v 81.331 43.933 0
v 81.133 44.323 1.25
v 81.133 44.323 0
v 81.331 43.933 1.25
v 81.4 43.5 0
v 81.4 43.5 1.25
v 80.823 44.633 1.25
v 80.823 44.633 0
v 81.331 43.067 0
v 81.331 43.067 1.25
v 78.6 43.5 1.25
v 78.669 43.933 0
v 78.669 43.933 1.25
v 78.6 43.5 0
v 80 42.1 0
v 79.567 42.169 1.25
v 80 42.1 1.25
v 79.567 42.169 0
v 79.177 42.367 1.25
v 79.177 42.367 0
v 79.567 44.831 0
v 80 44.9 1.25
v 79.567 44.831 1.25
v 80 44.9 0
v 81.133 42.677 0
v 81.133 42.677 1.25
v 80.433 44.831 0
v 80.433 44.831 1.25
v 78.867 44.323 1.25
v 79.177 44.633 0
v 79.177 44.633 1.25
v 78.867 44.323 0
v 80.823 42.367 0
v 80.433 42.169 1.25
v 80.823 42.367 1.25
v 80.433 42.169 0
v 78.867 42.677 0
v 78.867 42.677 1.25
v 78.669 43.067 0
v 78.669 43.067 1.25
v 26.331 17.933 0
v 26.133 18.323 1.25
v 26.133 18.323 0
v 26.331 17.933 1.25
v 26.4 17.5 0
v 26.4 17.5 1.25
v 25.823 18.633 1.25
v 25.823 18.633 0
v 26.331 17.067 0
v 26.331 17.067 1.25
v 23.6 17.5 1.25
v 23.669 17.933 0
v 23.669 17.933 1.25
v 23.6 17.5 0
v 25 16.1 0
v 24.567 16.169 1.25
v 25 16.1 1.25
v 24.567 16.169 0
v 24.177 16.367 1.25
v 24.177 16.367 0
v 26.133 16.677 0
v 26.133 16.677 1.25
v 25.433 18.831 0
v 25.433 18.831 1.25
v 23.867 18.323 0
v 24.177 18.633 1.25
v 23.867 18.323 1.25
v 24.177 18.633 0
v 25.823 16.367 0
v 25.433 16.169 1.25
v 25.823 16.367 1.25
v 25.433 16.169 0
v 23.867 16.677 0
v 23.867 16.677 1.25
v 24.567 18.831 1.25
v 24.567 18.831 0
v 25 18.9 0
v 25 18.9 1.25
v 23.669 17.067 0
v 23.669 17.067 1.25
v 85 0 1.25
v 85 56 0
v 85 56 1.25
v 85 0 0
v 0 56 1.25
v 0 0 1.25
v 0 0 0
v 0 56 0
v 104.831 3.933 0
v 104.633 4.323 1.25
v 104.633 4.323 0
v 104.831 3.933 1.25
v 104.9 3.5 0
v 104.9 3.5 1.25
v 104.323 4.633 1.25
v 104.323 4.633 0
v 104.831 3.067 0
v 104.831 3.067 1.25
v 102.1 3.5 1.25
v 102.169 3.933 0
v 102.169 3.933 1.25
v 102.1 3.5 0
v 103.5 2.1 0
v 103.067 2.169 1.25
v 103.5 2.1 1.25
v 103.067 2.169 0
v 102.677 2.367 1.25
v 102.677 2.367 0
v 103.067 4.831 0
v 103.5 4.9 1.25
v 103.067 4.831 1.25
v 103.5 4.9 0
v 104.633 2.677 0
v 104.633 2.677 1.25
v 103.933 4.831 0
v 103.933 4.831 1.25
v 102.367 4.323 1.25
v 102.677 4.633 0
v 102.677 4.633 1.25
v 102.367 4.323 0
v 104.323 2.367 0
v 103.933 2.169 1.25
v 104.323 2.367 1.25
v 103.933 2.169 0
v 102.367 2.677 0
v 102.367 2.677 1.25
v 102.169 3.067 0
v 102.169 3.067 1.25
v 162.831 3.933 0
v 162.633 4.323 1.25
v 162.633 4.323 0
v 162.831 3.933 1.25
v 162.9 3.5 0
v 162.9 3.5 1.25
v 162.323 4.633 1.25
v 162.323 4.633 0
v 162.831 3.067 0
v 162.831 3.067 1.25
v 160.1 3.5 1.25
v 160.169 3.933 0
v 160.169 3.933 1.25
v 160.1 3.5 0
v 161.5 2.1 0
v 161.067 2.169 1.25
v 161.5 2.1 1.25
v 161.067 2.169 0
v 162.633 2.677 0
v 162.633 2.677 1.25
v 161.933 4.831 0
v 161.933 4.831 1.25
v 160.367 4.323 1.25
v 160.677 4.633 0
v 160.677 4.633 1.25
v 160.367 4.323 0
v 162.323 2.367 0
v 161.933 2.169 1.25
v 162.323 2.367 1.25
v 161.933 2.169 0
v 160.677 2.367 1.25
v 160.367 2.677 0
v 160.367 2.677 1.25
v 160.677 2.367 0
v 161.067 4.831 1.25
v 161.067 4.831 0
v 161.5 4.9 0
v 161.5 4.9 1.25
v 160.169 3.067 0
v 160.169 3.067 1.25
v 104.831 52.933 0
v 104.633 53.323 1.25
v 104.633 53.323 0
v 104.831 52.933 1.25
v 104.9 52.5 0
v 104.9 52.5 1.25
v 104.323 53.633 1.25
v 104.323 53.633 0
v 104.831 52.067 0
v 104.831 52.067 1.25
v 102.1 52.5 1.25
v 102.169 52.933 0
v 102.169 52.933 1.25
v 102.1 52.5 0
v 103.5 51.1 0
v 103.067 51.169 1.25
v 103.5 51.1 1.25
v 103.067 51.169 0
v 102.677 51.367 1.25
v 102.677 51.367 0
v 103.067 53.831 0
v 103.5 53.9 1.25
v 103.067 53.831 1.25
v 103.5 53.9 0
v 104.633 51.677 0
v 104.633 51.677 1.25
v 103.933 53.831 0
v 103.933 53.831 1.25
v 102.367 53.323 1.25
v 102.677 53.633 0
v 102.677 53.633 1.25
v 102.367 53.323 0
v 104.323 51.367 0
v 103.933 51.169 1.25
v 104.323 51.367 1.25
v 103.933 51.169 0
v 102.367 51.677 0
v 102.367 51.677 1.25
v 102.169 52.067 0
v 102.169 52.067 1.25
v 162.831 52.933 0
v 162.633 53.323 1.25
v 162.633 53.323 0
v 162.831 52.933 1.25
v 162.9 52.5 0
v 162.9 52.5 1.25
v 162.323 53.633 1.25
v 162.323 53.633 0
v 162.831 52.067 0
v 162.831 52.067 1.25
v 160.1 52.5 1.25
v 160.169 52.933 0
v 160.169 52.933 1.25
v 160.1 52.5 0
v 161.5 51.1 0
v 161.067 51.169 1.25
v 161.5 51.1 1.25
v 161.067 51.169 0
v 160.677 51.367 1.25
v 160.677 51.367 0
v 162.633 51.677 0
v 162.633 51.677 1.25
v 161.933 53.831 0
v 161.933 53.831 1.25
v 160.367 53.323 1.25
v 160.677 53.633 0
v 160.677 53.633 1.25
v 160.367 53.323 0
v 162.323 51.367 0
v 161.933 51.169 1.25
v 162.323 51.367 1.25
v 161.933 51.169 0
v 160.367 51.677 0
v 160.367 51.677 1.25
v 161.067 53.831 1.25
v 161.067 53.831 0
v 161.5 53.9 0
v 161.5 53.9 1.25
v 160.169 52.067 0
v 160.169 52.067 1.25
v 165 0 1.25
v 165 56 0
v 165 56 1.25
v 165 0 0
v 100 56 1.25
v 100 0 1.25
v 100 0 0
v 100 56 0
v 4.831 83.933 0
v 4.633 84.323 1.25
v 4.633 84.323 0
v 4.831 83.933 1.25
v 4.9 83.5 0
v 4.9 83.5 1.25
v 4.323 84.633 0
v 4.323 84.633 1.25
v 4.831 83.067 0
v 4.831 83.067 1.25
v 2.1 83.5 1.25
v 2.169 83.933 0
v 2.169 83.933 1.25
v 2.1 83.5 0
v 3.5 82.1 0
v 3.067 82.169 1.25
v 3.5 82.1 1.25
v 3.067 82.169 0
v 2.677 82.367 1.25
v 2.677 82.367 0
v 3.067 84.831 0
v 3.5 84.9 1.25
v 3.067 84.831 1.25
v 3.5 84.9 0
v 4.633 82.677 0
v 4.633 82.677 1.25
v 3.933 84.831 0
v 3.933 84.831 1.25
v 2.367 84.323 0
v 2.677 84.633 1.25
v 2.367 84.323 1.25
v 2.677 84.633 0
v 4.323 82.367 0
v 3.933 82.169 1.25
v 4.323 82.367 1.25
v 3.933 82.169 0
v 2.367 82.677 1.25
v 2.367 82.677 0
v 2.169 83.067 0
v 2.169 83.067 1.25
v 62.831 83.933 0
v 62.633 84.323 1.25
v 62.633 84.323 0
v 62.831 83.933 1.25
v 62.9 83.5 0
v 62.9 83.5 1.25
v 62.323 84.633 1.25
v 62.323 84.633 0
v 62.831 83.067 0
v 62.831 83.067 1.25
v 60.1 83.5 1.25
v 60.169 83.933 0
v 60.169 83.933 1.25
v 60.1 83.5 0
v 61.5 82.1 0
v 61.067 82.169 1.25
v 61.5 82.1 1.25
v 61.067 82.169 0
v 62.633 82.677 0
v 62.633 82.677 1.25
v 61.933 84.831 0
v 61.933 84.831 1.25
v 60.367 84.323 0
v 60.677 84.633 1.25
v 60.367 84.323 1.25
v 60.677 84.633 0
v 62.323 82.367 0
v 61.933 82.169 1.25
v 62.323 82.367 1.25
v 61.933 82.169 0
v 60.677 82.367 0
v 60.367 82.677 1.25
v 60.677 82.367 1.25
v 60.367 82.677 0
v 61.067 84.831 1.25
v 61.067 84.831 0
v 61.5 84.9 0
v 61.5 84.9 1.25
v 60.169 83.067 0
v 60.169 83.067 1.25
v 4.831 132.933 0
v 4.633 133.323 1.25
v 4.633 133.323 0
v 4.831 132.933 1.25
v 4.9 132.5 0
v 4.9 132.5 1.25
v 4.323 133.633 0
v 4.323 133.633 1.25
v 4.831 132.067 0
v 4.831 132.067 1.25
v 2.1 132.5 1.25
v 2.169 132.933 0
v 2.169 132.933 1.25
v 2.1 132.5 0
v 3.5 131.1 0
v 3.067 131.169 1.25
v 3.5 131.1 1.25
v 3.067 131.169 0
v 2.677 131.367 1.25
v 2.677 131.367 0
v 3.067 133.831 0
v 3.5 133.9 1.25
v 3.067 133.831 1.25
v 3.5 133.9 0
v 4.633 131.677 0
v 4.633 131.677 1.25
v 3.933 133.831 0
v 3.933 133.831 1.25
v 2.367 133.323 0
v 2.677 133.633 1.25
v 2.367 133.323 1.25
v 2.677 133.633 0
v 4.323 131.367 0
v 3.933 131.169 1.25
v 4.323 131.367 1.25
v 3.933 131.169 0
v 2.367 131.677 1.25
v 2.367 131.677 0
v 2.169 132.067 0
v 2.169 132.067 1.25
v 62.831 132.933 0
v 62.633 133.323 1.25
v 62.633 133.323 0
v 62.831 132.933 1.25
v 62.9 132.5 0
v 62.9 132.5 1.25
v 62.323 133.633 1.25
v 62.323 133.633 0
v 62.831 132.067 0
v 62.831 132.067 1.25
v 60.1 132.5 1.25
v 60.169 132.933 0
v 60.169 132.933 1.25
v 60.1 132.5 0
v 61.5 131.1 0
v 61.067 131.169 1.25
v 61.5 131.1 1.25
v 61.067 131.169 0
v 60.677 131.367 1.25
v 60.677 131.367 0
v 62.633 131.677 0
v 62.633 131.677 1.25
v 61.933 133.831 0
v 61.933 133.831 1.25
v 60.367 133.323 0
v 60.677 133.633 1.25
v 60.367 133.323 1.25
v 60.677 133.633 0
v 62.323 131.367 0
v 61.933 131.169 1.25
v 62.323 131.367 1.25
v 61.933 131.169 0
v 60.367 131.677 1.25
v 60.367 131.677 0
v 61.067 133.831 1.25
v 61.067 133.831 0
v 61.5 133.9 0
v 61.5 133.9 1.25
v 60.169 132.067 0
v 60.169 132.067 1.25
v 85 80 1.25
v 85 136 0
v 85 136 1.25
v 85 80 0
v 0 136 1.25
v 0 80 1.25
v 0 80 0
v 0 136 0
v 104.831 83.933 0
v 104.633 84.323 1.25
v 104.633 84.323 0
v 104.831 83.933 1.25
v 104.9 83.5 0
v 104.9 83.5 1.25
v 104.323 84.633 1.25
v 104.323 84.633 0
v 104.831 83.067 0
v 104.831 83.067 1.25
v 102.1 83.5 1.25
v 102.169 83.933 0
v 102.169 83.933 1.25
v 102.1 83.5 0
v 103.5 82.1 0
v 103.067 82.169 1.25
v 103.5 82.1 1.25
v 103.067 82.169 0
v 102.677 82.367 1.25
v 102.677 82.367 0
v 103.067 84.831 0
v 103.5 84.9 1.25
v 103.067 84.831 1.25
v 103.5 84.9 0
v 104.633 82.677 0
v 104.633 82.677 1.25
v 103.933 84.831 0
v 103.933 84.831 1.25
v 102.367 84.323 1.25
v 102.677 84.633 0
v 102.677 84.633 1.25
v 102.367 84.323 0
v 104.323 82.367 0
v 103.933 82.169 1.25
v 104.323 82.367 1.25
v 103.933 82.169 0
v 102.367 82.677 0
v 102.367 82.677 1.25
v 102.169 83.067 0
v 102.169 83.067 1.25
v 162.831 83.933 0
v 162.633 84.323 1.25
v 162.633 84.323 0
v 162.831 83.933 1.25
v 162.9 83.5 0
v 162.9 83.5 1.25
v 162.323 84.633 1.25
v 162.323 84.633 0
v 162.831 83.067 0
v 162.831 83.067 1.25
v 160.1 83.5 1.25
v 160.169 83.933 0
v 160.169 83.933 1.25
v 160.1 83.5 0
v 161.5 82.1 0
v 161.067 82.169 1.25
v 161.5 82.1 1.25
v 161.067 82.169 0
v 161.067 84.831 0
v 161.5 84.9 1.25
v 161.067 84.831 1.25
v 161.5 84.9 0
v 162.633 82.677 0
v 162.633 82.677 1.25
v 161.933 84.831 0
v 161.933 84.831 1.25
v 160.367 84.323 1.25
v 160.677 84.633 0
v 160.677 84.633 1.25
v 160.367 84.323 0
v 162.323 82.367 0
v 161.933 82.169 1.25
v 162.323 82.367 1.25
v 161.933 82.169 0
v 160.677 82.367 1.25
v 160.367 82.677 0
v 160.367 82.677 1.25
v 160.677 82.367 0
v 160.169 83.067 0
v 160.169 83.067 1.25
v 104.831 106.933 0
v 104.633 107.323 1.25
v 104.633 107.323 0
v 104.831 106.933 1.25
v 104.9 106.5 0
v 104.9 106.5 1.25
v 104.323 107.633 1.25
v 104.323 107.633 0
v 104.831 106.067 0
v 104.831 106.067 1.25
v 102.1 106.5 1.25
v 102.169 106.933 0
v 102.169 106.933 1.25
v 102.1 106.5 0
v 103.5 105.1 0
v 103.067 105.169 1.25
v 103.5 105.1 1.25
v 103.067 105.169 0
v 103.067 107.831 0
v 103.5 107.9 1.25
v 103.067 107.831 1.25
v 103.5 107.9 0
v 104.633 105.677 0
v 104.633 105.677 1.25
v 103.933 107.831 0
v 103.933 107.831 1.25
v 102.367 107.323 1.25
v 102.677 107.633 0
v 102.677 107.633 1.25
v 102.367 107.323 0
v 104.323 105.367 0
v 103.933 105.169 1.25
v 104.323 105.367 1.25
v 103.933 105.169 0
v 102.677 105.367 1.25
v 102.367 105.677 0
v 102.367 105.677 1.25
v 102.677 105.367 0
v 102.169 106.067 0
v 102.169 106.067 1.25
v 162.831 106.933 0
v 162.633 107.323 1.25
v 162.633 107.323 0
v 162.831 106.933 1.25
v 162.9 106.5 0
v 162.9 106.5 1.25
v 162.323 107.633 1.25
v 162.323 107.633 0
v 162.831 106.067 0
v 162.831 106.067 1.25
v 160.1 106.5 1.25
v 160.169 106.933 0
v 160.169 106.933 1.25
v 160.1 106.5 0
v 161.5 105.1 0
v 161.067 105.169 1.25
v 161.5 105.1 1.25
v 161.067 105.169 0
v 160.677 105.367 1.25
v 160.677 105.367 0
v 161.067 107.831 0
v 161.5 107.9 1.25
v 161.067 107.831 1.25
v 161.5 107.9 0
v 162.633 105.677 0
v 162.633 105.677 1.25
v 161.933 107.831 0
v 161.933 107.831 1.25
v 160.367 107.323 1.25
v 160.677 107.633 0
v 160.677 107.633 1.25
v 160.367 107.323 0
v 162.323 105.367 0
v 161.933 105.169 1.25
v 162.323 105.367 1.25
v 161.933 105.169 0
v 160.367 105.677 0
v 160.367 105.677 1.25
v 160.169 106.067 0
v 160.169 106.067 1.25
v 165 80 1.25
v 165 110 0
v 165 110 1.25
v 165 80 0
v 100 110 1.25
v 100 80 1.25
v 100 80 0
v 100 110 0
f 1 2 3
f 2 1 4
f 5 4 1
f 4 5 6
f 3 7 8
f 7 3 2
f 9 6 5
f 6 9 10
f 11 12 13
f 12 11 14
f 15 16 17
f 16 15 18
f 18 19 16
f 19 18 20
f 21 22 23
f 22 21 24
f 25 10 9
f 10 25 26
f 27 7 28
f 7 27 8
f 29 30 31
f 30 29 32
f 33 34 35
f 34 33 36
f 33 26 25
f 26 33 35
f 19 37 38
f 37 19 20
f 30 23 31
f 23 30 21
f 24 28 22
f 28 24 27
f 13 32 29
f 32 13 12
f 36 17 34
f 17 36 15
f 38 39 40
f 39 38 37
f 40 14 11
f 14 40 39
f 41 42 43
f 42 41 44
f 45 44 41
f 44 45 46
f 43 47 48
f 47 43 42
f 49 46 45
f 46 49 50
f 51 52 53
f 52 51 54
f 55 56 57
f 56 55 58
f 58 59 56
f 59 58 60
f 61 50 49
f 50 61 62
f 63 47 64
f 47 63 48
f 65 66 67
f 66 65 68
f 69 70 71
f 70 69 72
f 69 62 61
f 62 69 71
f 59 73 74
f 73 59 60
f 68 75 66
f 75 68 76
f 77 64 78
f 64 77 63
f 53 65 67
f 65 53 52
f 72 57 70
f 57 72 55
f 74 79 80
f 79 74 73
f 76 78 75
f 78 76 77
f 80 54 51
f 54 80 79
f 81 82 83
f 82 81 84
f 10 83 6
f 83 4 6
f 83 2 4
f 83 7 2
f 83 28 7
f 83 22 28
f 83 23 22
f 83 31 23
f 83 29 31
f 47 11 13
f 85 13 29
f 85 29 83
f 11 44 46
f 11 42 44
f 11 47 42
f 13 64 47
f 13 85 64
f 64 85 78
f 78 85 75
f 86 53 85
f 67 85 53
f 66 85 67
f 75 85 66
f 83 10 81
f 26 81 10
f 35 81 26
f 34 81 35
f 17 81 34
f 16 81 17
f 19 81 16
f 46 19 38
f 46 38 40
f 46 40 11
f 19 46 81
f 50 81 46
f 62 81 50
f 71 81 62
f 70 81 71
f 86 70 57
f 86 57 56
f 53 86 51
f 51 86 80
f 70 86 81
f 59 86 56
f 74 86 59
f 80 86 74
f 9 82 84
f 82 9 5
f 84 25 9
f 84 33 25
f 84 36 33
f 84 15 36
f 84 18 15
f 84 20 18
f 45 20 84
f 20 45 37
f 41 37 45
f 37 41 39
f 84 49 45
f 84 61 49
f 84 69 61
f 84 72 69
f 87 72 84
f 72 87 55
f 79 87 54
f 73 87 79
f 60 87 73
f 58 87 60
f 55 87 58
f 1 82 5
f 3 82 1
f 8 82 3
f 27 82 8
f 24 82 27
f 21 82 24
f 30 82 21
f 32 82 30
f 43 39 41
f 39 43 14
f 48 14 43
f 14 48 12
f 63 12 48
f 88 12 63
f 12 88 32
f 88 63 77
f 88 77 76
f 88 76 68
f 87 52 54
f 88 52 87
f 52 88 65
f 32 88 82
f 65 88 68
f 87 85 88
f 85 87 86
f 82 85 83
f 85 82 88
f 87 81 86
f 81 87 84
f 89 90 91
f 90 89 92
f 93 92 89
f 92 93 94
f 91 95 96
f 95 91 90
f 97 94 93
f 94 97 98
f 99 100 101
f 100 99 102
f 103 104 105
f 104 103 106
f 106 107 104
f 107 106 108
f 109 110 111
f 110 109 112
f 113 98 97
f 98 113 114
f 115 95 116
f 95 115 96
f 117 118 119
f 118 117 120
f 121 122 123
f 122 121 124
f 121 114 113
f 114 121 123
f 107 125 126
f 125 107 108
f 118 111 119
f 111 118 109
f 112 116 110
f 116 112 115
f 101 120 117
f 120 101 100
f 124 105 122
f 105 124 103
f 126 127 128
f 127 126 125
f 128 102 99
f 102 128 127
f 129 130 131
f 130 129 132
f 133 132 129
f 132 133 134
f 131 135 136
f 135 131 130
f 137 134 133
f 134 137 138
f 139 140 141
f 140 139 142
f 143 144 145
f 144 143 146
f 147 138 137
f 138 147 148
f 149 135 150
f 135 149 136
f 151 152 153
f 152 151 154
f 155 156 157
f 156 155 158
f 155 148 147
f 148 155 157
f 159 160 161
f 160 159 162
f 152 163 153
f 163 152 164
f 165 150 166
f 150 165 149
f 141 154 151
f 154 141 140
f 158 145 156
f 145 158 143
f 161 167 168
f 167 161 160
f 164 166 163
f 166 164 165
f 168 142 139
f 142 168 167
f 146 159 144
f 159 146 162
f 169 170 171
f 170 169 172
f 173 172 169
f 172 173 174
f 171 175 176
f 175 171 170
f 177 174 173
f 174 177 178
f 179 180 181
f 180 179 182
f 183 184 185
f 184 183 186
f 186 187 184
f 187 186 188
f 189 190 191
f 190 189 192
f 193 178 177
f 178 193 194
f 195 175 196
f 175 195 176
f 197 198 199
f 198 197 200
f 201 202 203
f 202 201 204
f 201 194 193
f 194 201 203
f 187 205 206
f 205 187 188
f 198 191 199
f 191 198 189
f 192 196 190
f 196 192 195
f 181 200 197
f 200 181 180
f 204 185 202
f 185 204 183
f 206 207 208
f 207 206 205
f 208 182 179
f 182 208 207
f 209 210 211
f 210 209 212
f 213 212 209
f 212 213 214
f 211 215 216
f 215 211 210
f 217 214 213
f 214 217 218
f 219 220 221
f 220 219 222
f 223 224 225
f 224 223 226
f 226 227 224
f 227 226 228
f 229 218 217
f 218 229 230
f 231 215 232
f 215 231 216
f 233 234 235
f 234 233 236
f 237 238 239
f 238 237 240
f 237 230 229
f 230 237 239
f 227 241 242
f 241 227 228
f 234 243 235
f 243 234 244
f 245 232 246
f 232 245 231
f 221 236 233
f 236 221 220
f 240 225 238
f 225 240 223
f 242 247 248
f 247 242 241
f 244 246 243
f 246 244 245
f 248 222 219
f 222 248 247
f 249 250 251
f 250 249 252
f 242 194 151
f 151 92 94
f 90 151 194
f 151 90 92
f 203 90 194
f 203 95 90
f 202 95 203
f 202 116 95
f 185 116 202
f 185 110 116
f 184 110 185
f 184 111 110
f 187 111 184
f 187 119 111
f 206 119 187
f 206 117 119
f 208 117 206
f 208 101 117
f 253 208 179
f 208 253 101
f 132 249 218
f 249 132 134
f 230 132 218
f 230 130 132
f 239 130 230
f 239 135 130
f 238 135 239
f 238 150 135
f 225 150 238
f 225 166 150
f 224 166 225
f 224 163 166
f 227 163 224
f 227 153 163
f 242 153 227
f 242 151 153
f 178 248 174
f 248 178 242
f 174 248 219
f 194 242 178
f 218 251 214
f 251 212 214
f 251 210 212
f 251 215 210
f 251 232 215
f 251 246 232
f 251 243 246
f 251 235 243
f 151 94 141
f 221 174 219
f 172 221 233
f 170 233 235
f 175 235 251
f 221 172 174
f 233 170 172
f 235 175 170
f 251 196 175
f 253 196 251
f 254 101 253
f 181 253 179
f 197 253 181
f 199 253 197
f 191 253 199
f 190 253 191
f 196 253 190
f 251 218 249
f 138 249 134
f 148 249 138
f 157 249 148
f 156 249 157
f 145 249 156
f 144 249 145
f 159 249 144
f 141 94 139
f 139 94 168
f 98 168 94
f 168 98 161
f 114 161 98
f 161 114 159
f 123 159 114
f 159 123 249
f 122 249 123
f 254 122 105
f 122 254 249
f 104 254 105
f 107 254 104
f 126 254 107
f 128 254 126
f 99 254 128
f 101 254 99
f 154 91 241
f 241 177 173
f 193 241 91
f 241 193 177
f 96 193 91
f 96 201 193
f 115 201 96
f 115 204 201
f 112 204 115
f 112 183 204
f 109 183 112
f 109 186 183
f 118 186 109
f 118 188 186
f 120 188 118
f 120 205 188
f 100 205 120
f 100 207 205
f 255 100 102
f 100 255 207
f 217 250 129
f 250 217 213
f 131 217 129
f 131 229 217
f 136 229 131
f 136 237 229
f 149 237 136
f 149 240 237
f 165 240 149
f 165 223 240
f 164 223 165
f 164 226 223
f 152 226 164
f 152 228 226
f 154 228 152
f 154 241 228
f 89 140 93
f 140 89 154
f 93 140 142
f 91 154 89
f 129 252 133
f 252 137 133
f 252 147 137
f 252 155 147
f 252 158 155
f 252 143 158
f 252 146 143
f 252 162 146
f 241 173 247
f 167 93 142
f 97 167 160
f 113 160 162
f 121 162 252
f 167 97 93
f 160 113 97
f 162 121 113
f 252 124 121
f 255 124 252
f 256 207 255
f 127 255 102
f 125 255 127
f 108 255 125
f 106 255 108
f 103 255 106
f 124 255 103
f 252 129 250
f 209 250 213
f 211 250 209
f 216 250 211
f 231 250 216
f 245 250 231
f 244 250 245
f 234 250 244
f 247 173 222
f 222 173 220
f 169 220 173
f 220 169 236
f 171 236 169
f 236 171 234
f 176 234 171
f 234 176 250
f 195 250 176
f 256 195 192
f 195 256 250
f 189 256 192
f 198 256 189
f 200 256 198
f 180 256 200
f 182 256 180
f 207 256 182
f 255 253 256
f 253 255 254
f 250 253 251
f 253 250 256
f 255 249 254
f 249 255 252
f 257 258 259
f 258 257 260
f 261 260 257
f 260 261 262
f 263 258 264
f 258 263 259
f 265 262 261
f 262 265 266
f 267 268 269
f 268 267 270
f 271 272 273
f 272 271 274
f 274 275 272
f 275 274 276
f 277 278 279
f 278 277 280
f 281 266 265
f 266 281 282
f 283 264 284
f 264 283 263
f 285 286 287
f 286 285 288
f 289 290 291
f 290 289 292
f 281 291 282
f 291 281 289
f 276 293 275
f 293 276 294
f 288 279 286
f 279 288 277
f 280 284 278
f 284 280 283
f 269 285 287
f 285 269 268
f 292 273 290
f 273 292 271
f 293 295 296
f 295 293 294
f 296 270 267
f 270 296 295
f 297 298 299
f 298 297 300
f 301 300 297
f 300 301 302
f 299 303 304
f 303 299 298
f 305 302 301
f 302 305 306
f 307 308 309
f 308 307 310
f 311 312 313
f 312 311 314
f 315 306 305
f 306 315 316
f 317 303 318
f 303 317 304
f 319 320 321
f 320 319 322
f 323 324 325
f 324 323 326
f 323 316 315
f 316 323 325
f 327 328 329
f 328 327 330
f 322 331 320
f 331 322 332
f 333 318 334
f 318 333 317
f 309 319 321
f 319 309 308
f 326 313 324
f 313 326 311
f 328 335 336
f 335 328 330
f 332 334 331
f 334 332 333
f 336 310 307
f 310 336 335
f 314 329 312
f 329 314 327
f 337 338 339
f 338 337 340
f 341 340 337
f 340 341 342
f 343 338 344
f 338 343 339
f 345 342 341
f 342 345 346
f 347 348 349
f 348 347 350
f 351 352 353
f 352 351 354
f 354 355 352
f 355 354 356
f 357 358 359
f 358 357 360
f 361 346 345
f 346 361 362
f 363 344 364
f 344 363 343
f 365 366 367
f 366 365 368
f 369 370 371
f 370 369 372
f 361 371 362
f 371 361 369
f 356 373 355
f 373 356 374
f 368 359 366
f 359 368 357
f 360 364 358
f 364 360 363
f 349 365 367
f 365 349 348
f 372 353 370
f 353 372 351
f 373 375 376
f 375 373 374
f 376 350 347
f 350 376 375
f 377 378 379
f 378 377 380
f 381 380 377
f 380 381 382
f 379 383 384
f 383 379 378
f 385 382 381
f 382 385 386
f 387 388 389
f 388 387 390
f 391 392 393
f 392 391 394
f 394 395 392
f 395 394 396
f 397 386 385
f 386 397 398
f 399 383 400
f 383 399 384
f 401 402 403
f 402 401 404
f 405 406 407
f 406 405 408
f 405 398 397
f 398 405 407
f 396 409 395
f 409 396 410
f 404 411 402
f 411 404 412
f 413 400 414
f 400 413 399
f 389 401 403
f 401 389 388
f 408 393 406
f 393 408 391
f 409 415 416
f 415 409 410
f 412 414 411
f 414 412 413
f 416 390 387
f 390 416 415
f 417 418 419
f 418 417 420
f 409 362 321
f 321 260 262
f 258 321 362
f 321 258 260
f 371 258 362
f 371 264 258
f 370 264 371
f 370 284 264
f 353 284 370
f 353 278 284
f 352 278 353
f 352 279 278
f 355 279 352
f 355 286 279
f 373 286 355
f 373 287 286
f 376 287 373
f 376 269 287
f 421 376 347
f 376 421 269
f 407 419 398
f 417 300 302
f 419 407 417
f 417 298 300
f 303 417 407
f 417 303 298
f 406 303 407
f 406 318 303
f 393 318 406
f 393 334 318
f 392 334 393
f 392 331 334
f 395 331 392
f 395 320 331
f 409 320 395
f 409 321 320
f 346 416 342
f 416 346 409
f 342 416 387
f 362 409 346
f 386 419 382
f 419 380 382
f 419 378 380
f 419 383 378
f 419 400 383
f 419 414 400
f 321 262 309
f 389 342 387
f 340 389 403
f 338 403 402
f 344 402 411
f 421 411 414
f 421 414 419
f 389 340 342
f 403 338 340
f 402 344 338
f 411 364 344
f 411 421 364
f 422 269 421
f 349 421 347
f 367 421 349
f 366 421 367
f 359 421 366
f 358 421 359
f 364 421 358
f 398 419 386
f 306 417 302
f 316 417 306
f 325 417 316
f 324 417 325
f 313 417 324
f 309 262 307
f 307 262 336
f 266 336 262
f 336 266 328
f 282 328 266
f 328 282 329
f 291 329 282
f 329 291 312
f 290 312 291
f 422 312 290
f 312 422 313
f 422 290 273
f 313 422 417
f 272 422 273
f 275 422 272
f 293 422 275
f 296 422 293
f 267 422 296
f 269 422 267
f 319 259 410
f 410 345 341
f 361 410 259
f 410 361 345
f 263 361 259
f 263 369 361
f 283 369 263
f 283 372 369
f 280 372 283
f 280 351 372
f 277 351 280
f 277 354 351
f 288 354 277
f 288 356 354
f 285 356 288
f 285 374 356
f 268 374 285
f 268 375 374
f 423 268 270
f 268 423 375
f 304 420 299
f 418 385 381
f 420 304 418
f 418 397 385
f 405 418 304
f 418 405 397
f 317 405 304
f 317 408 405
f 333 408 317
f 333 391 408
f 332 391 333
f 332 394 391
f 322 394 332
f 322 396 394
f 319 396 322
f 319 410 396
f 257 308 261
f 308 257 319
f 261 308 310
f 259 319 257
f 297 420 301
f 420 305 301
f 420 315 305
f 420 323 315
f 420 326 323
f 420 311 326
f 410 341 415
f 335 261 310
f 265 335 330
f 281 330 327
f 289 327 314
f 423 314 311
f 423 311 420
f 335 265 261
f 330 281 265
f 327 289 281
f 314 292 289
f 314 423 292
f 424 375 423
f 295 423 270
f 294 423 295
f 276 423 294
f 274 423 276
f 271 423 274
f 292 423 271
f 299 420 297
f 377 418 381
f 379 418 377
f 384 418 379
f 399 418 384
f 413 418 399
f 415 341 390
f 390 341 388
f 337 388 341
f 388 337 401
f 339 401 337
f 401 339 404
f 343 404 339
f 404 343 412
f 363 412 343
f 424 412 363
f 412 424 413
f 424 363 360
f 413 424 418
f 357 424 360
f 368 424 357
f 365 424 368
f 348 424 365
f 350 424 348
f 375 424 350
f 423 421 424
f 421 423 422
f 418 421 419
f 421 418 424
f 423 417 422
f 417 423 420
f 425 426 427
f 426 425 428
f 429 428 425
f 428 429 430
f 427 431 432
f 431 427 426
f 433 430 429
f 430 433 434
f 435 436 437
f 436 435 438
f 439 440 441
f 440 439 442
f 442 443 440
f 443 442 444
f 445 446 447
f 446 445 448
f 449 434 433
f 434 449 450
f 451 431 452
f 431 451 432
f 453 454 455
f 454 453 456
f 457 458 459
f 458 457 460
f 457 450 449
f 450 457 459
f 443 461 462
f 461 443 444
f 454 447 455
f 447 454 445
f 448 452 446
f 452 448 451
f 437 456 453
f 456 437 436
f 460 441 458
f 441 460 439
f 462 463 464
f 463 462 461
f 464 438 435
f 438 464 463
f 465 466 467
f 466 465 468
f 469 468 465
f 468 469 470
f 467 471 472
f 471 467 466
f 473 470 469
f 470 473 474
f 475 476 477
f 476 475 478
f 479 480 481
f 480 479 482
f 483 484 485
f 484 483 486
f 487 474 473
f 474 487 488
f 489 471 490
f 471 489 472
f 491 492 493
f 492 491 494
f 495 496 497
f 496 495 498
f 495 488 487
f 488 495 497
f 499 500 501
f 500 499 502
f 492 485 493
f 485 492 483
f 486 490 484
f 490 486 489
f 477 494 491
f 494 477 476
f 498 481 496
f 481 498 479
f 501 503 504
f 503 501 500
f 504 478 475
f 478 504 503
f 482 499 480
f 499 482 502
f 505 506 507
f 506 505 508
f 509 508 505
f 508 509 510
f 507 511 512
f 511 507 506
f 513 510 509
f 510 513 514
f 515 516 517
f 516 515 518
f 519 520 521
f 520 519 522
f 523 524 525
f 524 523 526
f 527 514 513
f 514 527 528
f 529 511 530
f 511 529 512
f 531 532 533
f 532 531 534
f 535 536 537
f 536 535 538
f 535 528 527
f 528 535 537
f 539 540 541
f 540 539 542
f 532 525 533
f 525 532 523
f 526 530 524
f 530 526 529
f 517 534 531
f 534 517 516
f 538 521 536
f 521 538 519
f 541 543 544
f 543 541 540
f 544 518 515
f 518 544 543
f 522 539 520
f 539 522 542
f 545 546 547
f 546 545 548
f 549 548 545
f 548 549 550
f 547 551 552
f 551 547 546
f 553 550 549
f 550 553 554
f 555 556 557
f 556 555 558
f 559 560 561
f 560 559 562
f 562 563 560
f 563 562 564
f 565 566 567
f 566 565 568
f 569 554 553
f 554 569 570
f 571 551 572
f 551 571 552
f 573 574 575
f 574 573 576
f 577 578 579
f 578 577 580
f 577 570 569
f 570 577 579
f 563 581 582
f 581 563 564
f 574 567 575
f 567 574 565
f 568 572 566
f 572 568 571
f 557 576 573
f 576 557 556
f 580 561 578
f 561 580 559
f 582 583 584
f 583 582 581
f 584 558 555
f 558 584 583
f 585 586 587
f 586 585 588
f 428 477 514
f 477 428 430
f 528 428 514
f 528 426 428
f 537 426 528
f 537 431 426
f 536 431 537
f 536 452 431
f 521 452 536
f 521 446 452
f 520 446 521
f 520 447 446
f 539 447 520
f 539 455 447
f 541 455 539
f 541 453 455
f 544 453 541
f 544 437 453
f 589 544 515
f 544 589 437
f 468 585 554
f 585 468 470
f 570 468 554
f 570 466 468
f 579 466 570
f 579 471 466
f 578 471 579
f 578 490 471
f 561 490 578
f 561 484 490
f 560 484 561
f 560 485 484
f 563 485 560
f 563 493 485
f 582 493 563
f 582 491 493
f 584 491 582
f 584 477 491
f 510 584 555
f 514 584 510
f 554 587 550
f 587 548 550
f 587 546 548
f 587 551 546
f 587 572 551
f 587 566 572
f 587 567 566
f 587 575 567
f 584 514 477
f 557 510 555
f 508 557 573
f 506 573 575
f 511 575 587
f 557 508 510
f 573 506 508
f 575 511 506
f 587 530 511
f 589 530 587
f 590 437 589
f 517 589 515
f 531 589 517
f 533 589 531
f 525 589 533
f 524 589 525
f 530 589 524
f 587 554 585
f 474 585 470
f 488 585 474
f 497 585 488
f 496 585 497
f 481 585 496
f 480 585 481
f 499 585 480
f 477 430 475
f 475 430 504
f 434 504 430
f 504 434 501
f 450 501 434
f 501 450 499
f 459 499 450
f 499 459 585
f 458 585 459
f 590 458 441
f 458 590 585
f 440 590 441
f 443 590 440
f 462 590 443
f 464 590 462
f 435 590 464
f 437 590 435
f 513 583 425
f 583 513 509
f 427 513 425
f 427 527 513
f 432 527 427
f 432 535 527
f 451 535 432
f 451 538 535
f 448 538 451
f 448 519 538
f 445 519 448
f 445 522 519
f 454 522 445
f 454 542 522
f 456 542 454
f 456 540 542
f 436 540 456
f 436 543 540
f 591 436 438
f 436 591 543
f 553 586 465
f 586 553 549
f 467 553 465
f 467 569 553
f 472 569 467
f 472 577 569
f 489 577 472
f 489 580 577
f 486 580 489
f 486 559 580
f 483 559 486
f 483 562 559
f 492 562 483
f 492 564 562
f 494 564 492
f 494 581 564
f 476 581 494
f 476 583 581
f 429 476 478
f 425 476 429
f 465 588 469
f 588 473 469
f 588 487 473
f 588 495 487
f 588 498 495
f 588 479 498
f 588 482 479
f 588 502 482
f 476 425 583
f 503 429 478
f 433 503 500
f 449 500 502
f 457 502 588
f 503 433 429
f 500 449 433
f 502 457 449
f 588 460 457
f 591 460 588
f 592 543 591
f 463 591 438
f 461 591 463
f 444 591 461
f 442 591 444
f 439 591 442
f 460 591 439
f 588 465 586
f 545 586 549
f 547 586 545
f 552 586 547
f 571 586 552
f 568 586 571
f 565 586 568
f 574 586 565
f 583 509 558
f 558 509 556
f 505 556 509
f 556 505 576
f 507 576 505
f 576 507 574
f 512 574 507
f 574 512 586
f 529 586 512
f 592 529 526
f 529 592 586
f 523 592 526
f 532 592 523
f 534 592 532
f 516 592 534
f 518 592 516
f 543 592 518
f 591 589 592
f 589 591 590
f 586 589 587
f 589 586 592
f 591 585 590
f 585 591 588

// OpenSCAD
//Shut your Pi Hole! 
//An OpenSCAD library to assist with designing Raspberry Pi accessories

//This work is licensed under the Creative Commons Attribution-ShareAlike 4.0 International License. To view a copy of this license, visit http://creativecommons.org/licenses/by-sa/4.0/.
//© 2016 Dale Price

//Pi dimensions sourced from https://www.raspberrypi.org/documentation/hardware/raspberrypi/mechanical/
//Currently supports "1B", "1A+", "1B+", "2B", "3B", "Zero"

//get vector of [x,y] vectors of locations of mounting holes based on Pi version
function piHoleLocations (board="3B") = 
	(board=="1A+" || board=="1B+" || board=="2B" || board=="3B") ?
		[[3.5, 3.5], [61.5, 3.5], [3.5, 52.5], [61.5, 52.5]] : //pi 1B+, 2B, 3B
	(board=="Zero") ?
		[[3.5, 3.5], [61.5, 3.5], [3.5, 26.5], [61.5, 26.5]] : //pi zero
	(board=="1B") ?
		[[80, 43.5], [25, 17.5]] :
	[]; //invalid board

//get vector of [x,y,z] dimensions of board
//	dimensions are for PCB only, not ports or anything else
function piBoardDim (board="3B") =
	(board=="1B" || board=="1B+" || board=="2B" || board=="3B") ?
		[85, 56, 1.25] :
	(board=="Zero") ?
		[65, 30, 1.25] :
	(board == "1A+") ?
		[65, 56, 1.25] :
	[0,0,0];

//Mounting holes for a Raspberry Pi of the specified version
//	Parameters
//		board: the version of the raspberry pi to generate holes for
//		depth: the depth of the holes in mm
module piHoles (board, depth = 5, preview=true) {
	hd = 2.8; //radius of pi mounting holes plus a tiny bit extra to account for shrinkage when 3D printing
	hr = hd/2;

	//preview of the board itself
	if(preview==true)
		% piBoard(board);
	
	//mounting holes
	for(holePos = piHoleLocations(board)) {
		translate([holePos[0], holePos[1], -depth]) cylinder(d=hd, h=depth);
	}
}

//Preview of board dimensions for Raspberry Pi of the specified version
module piBoard (board) {
	difference() {
		cube(piBoardDim(board), center=false);
		translate([0,0,piBoardDim(board)[2] + 0.01]) piHoles(board, piBoardDim(board)[2] + 0.02, false);
	}

	//warn about possible inaccuracy of boards that don't currently have official documentation
	if(board == "1B") {
		echo("CAUTION: The mounting hole positions for the board you have selected may not be accurate because the Raspberry Pi Foundation does not currently provide official mechanical drawings for it.");
	}
}

//Snap-fit posts for mounting the Raspberry Pi
//	Parameters
//		board: version of the raspberry pi to mount
//		height: height of the top surface of the raspberry pi board off the base of the posts
//		preview: whether or not to show a preview of the board in place
module piPosts(board, height=5, preview=true) {
	piSize = piBoardDim(board);
	piHolePos = piHoleLocations(board);

	module pcbPost(height) {
		cylinder(d=2, h=height);
		cylinder(d1=5, d2=2, h=height - piSize[2] - 0.25);

		translate([0, 0.4, height]) scale([1.1, 1.1, 1]) cylinder(d=2, h=0.5);
	}
	
	for(holePos = piHolePos) {
		translate([holePos[0], holePos[1], 0]) pcbPost(height);
	}

	if(preview==true)
		% translate([0,0,height-piSize[2]]) piBoard(board);
}

color("DarkGreen", 1, $fn=20) {
	piBoard("1B");
	translate([100,0,0]) piBoard("1A+");
	translate([0,80,0]) piBoard("2B");
	translate([100,80,0]) piBoard("Zero");
}
